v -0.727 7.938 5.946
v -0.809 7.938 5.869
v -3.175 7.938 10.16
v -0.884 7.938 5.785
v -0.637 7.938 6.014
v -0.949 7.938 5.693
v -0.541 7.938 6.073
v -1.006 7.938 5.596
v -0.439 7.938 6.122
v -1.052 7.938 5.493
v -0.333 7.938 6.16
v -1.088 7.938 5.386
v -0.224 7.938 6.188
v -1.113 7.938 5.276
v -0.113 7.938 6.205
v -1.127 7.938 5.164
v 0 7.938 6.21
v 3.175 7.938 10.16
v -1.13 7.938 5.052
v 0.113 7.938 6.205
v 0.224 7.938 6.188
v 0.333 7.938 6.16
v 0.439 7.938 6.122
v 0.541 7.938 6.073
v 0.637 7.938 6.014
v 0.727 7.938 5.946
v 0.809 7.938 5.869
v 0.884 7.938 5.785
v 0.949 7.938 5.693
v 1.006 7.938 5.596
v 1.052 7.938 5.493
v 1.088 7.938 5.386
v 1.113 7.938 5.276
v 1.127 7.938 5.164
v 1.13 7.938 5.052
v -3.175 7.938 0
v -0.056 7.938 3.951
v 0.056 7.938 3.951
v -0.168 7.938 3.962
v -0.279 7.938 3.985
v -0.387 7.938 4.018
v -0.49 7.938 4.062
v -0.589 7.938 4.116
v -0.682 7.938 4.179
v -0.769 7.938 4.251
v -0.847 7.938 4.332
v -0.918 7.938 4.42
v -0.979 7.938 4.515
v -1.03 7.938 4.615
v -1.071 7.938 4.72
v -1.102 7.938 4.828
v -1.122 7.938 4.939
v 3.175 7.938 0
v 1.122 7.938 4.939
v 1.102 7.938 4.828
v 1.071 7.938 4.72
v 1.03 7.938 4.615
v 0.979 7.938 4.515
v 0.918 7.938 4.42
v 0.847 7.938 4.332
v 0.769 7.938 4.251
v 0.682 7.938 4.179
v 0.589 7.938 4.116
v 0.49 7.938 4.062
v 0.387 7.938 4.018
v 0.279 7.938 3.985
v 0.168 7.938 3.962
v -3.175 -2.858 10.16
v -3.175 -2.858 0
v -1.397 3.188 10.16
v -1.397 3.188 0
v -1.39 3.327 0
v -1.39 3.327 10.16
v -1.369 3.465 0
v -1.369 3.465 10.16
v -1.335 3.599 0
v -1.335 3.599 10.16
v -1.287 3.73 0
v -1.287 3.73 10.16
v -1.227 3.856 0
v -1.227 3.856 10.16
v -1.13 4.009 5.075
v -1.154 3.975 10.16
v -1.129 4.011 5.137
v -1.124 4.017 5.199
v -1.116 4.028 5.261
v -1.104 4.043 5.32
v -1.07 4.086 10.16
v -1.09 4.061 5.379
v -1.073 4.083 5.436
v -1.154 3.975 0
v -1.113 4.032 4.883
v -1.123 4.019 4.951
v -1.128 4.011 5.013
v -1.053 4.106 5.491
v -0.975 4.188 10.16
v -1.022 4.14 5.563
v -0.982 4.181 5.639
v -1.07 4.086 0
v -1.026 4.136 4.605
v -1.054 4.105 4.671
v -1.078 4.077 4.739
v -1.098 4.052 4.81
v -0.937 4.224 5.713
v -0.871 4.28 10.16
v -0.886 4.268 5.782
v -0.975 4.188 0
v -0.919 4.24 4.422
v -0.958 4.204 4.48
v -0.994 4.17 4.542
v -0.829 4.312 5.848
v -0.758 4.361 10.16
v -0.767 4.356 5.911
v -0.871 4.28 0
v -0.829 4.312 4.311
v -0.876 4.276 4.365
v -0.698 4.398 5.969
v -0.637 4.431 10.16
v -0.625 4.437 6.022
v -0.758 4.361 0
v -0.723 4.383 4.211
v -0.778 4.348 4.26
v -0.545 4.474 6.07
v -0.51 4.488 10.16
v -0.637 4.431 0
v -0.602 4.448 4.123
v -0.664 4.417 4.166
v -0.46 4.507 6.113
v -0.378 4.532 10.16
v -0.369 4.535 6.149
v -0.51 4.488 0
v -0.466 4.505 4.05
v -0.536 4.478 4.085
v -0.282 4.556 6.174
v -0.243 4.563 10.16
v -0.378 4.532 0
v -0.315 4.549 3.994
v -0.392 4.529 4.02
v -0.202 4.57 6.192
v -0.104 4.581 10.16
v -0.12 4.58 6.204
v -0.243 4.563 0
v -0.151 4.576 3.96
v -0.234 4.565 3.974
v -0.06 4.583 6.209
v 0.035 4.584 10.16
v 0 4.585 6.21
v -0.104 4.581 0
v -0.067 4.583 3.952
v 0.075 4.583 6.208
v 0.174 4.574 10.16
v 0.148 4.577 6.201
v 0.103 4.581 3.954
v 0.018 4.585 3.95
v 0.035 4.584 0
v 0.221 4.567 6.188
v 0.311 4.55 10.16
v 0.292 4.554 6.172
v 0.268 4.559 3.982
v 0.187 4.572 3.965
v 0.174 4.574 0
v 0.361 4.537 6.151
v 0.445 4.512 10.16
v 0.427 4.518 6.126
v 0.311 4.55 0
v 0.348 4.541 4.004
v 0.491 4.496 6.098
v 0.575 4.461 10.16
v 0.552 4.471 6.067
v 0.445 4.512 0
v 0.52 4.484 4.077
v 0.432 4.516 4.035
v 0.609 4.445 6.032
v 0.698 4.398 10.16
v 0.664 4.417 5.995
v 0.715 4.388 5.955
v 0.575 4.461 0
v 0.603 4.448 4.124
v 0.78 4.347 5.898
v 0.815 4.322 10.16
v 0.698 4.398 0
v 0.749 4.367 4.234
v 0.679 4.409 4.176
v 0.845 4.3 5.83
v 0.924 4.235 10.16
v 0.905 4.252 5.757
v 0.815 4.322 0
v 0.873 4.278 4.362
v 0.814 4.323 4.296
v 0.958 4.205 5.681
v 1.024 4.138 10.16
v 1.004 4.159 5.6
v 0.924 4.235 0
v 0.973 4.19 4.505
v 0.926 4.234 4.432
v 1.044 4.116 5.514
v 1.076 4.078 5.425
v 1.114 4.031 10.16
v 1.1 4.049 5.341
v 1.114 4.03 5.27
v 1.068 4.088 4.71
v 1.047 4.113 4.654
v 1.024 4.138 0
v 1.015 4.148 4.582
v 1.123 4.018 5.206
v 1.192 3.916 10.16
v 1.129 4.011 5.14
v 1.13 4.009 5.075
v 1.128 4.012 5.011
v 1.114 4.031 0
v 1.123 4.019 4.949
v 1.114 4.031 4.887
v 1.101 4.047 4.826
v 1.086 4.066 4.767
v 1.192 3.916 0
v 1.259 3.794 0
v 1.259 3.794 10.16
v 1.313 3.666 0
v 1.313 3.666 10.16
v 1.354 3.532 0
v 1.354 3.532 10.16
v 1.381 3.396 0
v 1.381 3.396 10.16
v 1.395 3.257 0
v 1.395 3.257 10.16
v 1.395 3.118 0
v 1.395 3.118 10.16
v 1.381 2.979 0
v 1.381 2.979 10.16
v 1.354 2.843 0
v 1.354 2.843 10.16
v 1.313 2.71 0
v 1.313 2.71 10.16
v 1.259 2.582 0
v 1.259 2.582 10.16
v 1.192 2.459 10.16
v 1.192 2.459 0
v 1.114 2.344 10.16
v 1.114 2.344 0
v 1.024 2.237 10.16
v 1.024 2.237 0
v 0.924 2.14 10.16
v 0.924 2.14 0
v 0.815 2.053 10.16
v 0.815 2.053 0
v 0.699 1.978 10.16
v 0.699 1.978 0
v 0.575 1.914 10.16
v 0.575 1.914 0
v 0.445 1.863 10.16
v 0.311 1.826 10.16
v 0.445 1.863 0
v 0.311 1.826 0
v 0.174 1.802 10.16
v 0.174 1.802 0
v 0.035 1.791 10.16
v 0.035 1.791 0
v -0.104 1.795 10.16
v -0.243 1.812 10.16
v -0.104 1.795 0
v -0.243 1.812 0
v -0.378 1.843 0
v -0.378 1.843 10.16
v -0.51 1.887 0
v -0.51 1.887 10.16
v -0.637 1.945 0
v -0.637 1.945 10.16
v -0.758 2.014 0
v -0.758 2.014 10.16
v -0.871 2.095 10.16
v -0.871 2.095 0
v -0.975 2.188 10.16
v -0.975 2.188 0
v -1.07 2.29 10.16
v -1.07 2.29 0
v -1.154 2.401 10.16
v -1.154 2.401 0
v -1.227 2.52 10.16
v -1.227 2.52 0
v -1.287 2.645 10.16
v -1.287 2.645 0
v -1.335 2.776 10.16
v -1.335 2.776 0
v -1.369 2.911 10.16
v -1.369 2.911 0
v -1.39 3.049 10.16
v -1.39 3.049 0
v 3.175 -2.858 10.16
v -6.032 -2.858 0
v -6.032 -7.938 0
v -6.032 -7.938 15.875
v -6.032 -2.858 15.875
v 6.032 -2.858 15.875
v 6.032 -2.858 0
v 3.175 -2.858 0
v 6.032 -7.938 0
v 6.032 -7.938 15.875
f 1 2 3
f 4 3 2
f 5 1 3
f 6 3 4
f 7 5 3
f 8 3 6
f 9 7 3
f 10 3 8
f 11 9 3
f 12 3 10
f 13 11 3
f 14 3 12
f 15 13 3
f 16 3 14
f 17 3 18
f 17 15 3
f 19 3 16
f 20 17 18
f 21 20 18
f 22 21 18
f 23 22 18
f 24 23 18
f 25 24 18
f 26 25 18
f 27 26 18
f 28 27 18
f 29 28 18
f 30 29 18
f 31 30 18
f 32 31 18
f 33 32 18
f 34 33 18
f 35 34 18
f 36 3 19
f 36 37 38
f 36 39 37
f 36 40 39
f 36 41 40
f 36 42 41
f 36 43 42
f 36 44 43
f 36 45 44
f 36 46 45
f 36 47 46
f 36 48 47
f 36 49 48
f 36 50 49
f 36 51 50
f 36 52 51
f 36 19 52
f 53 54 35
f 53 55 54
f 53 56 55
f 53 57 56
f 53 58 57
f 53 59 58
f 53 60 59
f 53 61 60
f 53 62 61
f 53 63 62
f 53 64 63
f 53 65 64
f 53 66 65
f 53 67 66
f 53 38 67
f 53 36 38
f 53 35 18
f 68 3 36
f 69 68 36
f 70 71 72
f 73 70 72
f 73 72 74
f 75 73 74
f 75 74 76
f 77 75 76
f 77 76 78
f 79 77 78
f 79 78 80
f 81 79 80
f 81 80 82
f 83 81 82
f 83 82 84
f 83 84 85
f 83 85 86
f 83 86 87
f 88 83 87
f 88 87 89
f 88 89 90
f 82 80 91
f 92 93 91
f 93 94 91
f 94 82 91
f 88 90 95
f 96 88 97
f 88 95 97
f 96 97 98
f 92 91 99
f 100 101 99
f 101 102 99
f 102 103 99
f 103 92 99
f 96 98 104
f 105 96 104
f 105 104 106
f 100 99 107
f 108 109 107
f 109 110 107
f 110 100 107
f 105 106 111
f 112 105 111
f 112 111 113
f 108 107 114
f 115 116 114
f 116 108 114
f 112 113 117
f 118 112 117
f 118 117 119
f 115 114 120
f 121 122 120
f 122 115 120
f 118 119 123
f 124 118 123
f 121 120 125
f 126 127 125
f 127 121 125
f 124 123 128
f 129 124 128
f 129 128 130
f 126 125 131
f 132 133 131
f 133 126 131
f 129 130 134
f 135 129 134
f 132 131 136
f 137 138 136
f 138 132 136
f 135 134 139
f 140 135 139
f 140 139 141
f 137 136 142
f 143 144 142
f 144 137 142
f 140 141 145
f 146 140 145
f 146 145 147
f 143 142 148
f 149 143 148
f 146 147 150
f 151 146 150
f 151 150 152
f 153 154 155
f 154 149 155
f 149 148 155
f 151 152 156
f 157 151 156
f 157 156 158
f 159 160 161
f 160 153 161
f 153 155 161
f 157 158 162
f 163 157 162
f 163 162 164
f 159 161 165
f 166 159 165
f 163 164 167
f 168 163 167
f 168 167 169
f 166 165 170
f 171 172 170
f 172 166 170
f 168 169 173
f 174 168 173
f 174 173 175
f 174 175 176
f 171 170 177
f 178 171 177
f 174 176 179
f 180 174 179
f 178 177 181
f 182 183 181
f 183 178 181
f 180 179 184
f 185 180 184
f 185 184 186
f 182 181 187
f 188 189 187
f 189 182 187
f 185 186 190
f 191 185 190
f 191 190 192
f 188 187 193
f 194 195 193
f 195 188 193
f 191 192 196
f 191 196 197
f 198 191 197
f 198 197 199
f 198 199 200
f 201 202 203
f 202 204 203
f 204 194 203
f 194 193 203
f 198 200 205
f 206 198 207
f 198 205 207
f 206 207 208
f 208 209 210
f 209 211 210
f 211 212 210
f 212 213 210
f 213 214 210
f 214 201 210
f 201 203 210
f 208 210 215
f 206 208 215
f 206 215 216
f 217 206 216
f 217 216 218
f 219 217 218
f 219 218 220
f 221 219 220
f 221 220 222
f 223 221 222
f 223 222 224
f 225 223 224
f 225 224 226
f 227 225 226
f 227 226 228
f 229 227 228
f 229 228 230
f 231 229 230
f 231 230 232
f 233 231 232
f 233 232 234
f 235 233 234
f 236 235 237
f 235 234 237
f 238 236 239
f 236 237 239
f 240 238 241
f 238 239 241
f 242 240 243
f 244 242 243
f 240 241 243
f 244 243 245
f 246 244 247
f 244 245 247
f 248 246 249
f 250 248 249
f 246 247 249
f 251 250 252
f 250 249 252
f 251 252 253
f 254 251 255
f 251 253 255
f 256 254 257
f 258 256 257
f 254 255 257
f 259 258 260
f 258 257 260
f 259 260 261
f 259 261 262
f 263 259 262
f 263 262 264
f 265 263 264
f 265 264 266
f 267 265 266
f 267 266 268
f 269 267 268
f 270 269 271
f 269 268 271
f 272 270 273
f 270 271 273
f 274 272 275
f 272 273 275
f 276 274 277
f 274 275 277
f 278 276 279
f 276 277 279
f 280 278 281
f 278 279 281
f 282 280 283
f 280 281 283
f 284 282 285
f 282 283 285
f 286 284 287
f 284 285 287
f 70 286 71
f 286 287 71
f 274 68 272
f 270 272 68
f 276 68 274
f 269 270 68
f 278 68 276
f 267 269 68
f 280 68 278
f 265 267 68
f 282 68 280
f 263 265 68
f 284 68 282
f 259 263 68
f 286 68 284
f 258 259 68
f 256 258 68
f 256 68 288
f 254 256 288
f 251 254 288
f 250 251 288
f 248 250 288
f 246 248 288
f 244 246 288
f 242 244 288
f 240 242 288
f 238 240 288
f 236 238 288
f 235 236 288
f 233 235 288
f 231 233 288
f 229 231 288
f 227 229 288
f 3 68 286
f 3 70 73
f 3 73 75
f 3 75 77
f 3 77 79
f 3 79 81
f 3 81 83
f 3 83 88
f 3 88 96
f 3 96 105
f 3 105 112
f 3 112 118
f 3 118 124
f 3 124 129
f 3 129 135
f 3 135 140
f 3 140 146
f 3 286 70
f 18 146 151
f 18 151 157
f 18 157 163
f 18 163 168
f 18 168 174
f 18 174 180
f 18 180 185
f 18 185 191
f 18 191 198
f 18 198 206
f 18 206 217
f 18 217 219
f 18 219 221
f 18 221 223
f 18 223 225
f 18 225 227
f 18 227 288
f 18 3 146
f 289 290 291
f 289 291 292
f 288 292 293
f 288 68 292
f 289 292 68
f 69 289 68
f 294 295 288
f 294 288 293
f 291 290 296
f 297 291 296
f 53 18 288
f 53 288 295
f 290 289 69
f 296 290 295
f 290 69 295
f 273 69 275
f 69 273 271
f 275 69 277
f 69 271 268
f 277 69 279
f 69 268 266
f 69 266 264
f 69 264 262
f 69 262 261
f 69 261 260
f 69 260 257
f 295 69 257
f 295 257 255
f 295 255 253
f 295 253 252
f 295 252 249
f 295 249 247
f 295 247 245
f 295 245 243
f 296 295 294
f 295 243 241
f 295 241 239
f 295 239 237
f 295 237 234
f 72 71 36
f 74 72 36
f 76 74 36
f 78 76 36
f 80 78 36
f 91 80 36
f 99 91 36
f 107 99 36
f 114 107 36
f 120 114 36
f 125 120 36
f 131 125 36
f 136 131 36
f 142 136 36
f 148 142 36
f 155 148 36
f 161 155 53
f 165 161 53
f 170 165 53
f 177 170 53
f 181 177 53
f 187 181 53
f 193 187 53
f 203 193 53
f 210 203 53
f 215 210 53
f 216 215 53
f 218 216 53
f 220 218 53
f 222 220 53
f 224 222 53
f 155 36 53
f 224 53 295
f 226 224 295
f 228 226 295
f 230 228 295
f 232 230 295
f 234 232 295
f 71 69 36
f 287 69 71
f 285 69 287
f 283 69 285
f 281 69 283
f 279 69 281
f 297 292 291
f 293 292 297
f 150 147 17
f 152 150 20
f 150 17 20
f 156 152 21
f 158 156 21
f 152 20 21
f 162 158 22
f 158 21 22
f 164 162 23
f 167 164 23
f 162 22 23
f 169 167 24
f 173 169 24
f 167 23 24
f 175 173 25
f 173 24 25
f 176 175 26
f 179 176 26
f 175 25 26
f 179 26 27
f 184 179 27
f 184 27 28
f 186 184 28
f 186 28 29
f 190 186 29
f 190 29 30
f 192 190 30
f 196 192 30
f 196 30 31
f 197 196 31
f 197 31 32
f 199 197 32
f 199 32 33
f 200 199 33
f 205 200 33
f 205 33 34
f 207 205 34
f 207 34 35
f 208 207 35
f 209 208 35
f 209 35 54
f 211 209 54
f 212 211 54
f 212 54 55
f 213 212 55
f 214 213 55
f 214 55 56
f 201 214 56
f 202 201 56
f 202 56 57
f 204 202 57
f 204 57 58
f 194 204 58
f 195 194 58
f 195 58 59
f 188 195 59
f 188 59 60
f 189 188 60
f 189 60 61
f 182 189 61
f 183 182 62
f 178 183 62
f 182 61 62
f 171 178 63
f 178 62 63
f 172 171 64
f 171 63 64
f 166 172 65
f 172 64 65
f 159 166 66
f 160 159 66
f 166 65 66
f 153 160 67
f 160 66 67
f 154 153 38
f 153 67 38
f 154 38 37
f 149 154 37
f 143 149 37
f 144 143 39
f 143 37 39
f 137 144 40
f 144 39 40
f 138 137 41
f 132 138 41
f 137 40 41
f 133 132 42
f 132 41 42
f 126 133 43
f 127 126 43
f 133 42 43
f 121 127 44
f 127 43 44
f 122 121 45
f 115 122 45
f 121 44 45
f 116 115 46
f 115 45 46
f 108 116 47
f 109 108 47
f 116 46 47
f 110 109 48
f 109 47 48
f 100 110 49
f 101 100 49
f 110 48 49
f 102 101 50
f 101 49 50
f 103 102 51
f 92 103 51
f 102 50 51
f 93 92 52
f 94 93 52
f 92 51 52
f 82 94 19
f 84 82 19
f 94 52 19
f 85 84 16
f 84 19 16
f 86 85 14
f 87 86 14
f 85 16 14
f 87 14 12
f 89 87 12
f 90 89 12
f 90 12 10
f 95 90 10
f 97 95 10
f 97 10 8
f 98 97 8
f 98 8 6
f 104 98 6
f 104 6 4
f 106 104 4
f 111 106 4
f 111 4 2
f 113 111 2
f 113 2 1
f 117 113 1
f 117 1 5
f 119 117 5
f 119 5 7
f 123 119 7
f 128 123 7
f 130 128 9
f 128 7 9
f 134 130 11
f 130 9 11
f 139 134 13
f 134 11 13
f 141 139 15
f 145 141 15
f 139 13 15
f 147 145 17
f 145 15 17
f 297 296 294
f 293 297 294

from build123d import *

# Parameters (mm, degrees)
SKETCH1_W                  = 12.065
SKETCH1_H                  = 15.875
BASE_DEPTH                 = 15.875
SKETCH3_R                  = 1.397
SHAFTHOLE_DEPTH            = 19.745948562
SKETCH7_W                  = 18.144441676
SKETCH7_H                  = 22.667604572
SKETCH7_W_2                = 6.35
SKETCH7_H_2                = 10.16
CUT_EXTRUDE1_DEPTH         = 10.795
F_4_40_TAPPED_HOLE1_REACH  = 27.692
F_4_40_TAPPED_HOLE1_BORE_R = 1.1303


with BuildPart() as part:
    # Sketch1 → Base (new body)
    with BuildSketch(Plane.XY):
        Rectangle(SKETCH1_W, SKETCH1_H)
    extrude(amount=BASE_DEPTH)

    # Sketch3 → ShaftHole (cut, through all)
    with BuildSketch(Plane(origin=(0, 0, 0), x_dir=(-1, 0, 0), z_dir=(0, 0, -1))):
        with Locations((0, 3.1877)):
            Circle(SKETCH3_R)
    extrude(amount=-SHAFTHOLE_DEPTH, mode=Mode.SUBTRACT)

    # Sketch7 → Cut-Extrude1 (cut)
    with BuildSketch(Plane(origin=(0, 7.9375, 0), x_dir=(1, 0, 0), z_dir=(0, 1, 0))):
        with Locations((0.669483701, -7.615912702)):
            Rectangle(SKETCH7_W, SKETCH7_H)
        with Locations((0, -5.08)):
            Rectangle(SKETCH7_W_2, SKETCH7_H_2, mode=Mode.SUBTRACT)
    extrude(amount=-CUT_EXTRUDE1_DEPTH, mode=Mode.SUBTRACT)

    # #4-40 Tapped Hole1 bore → #4-40 Tapped Hole1 (cut, up to next)
    with BuildSketch(Plane(origin=(5.103236707, 7.9375, -0.979692924), x_dir=(0, 0, 1), z_dir=(0, 1, 0)), mode=Mode.PRIVATE) as f_4_40_tapped_hole1_sk1:
        with Locations((6.059692924, -5.103236707)):
            Circle(F_4_40_TAPPED_HOLE1_BORE_R)
    f_4_40_tapped_hole1_tool1 = extrude(f_4_40_tapped_hole1_sk1.sketch, amount=-F_4_40_TAPPED_HOLE1_REACH, mode=Mode.PRIVATE) & part.part
    add(f_4_40_tapped_hole1_tool1.solids().sort_by_distance((0, 7.9375, 5.08))[0], mode=Mode.SUBTRACT)


solid = part.part
